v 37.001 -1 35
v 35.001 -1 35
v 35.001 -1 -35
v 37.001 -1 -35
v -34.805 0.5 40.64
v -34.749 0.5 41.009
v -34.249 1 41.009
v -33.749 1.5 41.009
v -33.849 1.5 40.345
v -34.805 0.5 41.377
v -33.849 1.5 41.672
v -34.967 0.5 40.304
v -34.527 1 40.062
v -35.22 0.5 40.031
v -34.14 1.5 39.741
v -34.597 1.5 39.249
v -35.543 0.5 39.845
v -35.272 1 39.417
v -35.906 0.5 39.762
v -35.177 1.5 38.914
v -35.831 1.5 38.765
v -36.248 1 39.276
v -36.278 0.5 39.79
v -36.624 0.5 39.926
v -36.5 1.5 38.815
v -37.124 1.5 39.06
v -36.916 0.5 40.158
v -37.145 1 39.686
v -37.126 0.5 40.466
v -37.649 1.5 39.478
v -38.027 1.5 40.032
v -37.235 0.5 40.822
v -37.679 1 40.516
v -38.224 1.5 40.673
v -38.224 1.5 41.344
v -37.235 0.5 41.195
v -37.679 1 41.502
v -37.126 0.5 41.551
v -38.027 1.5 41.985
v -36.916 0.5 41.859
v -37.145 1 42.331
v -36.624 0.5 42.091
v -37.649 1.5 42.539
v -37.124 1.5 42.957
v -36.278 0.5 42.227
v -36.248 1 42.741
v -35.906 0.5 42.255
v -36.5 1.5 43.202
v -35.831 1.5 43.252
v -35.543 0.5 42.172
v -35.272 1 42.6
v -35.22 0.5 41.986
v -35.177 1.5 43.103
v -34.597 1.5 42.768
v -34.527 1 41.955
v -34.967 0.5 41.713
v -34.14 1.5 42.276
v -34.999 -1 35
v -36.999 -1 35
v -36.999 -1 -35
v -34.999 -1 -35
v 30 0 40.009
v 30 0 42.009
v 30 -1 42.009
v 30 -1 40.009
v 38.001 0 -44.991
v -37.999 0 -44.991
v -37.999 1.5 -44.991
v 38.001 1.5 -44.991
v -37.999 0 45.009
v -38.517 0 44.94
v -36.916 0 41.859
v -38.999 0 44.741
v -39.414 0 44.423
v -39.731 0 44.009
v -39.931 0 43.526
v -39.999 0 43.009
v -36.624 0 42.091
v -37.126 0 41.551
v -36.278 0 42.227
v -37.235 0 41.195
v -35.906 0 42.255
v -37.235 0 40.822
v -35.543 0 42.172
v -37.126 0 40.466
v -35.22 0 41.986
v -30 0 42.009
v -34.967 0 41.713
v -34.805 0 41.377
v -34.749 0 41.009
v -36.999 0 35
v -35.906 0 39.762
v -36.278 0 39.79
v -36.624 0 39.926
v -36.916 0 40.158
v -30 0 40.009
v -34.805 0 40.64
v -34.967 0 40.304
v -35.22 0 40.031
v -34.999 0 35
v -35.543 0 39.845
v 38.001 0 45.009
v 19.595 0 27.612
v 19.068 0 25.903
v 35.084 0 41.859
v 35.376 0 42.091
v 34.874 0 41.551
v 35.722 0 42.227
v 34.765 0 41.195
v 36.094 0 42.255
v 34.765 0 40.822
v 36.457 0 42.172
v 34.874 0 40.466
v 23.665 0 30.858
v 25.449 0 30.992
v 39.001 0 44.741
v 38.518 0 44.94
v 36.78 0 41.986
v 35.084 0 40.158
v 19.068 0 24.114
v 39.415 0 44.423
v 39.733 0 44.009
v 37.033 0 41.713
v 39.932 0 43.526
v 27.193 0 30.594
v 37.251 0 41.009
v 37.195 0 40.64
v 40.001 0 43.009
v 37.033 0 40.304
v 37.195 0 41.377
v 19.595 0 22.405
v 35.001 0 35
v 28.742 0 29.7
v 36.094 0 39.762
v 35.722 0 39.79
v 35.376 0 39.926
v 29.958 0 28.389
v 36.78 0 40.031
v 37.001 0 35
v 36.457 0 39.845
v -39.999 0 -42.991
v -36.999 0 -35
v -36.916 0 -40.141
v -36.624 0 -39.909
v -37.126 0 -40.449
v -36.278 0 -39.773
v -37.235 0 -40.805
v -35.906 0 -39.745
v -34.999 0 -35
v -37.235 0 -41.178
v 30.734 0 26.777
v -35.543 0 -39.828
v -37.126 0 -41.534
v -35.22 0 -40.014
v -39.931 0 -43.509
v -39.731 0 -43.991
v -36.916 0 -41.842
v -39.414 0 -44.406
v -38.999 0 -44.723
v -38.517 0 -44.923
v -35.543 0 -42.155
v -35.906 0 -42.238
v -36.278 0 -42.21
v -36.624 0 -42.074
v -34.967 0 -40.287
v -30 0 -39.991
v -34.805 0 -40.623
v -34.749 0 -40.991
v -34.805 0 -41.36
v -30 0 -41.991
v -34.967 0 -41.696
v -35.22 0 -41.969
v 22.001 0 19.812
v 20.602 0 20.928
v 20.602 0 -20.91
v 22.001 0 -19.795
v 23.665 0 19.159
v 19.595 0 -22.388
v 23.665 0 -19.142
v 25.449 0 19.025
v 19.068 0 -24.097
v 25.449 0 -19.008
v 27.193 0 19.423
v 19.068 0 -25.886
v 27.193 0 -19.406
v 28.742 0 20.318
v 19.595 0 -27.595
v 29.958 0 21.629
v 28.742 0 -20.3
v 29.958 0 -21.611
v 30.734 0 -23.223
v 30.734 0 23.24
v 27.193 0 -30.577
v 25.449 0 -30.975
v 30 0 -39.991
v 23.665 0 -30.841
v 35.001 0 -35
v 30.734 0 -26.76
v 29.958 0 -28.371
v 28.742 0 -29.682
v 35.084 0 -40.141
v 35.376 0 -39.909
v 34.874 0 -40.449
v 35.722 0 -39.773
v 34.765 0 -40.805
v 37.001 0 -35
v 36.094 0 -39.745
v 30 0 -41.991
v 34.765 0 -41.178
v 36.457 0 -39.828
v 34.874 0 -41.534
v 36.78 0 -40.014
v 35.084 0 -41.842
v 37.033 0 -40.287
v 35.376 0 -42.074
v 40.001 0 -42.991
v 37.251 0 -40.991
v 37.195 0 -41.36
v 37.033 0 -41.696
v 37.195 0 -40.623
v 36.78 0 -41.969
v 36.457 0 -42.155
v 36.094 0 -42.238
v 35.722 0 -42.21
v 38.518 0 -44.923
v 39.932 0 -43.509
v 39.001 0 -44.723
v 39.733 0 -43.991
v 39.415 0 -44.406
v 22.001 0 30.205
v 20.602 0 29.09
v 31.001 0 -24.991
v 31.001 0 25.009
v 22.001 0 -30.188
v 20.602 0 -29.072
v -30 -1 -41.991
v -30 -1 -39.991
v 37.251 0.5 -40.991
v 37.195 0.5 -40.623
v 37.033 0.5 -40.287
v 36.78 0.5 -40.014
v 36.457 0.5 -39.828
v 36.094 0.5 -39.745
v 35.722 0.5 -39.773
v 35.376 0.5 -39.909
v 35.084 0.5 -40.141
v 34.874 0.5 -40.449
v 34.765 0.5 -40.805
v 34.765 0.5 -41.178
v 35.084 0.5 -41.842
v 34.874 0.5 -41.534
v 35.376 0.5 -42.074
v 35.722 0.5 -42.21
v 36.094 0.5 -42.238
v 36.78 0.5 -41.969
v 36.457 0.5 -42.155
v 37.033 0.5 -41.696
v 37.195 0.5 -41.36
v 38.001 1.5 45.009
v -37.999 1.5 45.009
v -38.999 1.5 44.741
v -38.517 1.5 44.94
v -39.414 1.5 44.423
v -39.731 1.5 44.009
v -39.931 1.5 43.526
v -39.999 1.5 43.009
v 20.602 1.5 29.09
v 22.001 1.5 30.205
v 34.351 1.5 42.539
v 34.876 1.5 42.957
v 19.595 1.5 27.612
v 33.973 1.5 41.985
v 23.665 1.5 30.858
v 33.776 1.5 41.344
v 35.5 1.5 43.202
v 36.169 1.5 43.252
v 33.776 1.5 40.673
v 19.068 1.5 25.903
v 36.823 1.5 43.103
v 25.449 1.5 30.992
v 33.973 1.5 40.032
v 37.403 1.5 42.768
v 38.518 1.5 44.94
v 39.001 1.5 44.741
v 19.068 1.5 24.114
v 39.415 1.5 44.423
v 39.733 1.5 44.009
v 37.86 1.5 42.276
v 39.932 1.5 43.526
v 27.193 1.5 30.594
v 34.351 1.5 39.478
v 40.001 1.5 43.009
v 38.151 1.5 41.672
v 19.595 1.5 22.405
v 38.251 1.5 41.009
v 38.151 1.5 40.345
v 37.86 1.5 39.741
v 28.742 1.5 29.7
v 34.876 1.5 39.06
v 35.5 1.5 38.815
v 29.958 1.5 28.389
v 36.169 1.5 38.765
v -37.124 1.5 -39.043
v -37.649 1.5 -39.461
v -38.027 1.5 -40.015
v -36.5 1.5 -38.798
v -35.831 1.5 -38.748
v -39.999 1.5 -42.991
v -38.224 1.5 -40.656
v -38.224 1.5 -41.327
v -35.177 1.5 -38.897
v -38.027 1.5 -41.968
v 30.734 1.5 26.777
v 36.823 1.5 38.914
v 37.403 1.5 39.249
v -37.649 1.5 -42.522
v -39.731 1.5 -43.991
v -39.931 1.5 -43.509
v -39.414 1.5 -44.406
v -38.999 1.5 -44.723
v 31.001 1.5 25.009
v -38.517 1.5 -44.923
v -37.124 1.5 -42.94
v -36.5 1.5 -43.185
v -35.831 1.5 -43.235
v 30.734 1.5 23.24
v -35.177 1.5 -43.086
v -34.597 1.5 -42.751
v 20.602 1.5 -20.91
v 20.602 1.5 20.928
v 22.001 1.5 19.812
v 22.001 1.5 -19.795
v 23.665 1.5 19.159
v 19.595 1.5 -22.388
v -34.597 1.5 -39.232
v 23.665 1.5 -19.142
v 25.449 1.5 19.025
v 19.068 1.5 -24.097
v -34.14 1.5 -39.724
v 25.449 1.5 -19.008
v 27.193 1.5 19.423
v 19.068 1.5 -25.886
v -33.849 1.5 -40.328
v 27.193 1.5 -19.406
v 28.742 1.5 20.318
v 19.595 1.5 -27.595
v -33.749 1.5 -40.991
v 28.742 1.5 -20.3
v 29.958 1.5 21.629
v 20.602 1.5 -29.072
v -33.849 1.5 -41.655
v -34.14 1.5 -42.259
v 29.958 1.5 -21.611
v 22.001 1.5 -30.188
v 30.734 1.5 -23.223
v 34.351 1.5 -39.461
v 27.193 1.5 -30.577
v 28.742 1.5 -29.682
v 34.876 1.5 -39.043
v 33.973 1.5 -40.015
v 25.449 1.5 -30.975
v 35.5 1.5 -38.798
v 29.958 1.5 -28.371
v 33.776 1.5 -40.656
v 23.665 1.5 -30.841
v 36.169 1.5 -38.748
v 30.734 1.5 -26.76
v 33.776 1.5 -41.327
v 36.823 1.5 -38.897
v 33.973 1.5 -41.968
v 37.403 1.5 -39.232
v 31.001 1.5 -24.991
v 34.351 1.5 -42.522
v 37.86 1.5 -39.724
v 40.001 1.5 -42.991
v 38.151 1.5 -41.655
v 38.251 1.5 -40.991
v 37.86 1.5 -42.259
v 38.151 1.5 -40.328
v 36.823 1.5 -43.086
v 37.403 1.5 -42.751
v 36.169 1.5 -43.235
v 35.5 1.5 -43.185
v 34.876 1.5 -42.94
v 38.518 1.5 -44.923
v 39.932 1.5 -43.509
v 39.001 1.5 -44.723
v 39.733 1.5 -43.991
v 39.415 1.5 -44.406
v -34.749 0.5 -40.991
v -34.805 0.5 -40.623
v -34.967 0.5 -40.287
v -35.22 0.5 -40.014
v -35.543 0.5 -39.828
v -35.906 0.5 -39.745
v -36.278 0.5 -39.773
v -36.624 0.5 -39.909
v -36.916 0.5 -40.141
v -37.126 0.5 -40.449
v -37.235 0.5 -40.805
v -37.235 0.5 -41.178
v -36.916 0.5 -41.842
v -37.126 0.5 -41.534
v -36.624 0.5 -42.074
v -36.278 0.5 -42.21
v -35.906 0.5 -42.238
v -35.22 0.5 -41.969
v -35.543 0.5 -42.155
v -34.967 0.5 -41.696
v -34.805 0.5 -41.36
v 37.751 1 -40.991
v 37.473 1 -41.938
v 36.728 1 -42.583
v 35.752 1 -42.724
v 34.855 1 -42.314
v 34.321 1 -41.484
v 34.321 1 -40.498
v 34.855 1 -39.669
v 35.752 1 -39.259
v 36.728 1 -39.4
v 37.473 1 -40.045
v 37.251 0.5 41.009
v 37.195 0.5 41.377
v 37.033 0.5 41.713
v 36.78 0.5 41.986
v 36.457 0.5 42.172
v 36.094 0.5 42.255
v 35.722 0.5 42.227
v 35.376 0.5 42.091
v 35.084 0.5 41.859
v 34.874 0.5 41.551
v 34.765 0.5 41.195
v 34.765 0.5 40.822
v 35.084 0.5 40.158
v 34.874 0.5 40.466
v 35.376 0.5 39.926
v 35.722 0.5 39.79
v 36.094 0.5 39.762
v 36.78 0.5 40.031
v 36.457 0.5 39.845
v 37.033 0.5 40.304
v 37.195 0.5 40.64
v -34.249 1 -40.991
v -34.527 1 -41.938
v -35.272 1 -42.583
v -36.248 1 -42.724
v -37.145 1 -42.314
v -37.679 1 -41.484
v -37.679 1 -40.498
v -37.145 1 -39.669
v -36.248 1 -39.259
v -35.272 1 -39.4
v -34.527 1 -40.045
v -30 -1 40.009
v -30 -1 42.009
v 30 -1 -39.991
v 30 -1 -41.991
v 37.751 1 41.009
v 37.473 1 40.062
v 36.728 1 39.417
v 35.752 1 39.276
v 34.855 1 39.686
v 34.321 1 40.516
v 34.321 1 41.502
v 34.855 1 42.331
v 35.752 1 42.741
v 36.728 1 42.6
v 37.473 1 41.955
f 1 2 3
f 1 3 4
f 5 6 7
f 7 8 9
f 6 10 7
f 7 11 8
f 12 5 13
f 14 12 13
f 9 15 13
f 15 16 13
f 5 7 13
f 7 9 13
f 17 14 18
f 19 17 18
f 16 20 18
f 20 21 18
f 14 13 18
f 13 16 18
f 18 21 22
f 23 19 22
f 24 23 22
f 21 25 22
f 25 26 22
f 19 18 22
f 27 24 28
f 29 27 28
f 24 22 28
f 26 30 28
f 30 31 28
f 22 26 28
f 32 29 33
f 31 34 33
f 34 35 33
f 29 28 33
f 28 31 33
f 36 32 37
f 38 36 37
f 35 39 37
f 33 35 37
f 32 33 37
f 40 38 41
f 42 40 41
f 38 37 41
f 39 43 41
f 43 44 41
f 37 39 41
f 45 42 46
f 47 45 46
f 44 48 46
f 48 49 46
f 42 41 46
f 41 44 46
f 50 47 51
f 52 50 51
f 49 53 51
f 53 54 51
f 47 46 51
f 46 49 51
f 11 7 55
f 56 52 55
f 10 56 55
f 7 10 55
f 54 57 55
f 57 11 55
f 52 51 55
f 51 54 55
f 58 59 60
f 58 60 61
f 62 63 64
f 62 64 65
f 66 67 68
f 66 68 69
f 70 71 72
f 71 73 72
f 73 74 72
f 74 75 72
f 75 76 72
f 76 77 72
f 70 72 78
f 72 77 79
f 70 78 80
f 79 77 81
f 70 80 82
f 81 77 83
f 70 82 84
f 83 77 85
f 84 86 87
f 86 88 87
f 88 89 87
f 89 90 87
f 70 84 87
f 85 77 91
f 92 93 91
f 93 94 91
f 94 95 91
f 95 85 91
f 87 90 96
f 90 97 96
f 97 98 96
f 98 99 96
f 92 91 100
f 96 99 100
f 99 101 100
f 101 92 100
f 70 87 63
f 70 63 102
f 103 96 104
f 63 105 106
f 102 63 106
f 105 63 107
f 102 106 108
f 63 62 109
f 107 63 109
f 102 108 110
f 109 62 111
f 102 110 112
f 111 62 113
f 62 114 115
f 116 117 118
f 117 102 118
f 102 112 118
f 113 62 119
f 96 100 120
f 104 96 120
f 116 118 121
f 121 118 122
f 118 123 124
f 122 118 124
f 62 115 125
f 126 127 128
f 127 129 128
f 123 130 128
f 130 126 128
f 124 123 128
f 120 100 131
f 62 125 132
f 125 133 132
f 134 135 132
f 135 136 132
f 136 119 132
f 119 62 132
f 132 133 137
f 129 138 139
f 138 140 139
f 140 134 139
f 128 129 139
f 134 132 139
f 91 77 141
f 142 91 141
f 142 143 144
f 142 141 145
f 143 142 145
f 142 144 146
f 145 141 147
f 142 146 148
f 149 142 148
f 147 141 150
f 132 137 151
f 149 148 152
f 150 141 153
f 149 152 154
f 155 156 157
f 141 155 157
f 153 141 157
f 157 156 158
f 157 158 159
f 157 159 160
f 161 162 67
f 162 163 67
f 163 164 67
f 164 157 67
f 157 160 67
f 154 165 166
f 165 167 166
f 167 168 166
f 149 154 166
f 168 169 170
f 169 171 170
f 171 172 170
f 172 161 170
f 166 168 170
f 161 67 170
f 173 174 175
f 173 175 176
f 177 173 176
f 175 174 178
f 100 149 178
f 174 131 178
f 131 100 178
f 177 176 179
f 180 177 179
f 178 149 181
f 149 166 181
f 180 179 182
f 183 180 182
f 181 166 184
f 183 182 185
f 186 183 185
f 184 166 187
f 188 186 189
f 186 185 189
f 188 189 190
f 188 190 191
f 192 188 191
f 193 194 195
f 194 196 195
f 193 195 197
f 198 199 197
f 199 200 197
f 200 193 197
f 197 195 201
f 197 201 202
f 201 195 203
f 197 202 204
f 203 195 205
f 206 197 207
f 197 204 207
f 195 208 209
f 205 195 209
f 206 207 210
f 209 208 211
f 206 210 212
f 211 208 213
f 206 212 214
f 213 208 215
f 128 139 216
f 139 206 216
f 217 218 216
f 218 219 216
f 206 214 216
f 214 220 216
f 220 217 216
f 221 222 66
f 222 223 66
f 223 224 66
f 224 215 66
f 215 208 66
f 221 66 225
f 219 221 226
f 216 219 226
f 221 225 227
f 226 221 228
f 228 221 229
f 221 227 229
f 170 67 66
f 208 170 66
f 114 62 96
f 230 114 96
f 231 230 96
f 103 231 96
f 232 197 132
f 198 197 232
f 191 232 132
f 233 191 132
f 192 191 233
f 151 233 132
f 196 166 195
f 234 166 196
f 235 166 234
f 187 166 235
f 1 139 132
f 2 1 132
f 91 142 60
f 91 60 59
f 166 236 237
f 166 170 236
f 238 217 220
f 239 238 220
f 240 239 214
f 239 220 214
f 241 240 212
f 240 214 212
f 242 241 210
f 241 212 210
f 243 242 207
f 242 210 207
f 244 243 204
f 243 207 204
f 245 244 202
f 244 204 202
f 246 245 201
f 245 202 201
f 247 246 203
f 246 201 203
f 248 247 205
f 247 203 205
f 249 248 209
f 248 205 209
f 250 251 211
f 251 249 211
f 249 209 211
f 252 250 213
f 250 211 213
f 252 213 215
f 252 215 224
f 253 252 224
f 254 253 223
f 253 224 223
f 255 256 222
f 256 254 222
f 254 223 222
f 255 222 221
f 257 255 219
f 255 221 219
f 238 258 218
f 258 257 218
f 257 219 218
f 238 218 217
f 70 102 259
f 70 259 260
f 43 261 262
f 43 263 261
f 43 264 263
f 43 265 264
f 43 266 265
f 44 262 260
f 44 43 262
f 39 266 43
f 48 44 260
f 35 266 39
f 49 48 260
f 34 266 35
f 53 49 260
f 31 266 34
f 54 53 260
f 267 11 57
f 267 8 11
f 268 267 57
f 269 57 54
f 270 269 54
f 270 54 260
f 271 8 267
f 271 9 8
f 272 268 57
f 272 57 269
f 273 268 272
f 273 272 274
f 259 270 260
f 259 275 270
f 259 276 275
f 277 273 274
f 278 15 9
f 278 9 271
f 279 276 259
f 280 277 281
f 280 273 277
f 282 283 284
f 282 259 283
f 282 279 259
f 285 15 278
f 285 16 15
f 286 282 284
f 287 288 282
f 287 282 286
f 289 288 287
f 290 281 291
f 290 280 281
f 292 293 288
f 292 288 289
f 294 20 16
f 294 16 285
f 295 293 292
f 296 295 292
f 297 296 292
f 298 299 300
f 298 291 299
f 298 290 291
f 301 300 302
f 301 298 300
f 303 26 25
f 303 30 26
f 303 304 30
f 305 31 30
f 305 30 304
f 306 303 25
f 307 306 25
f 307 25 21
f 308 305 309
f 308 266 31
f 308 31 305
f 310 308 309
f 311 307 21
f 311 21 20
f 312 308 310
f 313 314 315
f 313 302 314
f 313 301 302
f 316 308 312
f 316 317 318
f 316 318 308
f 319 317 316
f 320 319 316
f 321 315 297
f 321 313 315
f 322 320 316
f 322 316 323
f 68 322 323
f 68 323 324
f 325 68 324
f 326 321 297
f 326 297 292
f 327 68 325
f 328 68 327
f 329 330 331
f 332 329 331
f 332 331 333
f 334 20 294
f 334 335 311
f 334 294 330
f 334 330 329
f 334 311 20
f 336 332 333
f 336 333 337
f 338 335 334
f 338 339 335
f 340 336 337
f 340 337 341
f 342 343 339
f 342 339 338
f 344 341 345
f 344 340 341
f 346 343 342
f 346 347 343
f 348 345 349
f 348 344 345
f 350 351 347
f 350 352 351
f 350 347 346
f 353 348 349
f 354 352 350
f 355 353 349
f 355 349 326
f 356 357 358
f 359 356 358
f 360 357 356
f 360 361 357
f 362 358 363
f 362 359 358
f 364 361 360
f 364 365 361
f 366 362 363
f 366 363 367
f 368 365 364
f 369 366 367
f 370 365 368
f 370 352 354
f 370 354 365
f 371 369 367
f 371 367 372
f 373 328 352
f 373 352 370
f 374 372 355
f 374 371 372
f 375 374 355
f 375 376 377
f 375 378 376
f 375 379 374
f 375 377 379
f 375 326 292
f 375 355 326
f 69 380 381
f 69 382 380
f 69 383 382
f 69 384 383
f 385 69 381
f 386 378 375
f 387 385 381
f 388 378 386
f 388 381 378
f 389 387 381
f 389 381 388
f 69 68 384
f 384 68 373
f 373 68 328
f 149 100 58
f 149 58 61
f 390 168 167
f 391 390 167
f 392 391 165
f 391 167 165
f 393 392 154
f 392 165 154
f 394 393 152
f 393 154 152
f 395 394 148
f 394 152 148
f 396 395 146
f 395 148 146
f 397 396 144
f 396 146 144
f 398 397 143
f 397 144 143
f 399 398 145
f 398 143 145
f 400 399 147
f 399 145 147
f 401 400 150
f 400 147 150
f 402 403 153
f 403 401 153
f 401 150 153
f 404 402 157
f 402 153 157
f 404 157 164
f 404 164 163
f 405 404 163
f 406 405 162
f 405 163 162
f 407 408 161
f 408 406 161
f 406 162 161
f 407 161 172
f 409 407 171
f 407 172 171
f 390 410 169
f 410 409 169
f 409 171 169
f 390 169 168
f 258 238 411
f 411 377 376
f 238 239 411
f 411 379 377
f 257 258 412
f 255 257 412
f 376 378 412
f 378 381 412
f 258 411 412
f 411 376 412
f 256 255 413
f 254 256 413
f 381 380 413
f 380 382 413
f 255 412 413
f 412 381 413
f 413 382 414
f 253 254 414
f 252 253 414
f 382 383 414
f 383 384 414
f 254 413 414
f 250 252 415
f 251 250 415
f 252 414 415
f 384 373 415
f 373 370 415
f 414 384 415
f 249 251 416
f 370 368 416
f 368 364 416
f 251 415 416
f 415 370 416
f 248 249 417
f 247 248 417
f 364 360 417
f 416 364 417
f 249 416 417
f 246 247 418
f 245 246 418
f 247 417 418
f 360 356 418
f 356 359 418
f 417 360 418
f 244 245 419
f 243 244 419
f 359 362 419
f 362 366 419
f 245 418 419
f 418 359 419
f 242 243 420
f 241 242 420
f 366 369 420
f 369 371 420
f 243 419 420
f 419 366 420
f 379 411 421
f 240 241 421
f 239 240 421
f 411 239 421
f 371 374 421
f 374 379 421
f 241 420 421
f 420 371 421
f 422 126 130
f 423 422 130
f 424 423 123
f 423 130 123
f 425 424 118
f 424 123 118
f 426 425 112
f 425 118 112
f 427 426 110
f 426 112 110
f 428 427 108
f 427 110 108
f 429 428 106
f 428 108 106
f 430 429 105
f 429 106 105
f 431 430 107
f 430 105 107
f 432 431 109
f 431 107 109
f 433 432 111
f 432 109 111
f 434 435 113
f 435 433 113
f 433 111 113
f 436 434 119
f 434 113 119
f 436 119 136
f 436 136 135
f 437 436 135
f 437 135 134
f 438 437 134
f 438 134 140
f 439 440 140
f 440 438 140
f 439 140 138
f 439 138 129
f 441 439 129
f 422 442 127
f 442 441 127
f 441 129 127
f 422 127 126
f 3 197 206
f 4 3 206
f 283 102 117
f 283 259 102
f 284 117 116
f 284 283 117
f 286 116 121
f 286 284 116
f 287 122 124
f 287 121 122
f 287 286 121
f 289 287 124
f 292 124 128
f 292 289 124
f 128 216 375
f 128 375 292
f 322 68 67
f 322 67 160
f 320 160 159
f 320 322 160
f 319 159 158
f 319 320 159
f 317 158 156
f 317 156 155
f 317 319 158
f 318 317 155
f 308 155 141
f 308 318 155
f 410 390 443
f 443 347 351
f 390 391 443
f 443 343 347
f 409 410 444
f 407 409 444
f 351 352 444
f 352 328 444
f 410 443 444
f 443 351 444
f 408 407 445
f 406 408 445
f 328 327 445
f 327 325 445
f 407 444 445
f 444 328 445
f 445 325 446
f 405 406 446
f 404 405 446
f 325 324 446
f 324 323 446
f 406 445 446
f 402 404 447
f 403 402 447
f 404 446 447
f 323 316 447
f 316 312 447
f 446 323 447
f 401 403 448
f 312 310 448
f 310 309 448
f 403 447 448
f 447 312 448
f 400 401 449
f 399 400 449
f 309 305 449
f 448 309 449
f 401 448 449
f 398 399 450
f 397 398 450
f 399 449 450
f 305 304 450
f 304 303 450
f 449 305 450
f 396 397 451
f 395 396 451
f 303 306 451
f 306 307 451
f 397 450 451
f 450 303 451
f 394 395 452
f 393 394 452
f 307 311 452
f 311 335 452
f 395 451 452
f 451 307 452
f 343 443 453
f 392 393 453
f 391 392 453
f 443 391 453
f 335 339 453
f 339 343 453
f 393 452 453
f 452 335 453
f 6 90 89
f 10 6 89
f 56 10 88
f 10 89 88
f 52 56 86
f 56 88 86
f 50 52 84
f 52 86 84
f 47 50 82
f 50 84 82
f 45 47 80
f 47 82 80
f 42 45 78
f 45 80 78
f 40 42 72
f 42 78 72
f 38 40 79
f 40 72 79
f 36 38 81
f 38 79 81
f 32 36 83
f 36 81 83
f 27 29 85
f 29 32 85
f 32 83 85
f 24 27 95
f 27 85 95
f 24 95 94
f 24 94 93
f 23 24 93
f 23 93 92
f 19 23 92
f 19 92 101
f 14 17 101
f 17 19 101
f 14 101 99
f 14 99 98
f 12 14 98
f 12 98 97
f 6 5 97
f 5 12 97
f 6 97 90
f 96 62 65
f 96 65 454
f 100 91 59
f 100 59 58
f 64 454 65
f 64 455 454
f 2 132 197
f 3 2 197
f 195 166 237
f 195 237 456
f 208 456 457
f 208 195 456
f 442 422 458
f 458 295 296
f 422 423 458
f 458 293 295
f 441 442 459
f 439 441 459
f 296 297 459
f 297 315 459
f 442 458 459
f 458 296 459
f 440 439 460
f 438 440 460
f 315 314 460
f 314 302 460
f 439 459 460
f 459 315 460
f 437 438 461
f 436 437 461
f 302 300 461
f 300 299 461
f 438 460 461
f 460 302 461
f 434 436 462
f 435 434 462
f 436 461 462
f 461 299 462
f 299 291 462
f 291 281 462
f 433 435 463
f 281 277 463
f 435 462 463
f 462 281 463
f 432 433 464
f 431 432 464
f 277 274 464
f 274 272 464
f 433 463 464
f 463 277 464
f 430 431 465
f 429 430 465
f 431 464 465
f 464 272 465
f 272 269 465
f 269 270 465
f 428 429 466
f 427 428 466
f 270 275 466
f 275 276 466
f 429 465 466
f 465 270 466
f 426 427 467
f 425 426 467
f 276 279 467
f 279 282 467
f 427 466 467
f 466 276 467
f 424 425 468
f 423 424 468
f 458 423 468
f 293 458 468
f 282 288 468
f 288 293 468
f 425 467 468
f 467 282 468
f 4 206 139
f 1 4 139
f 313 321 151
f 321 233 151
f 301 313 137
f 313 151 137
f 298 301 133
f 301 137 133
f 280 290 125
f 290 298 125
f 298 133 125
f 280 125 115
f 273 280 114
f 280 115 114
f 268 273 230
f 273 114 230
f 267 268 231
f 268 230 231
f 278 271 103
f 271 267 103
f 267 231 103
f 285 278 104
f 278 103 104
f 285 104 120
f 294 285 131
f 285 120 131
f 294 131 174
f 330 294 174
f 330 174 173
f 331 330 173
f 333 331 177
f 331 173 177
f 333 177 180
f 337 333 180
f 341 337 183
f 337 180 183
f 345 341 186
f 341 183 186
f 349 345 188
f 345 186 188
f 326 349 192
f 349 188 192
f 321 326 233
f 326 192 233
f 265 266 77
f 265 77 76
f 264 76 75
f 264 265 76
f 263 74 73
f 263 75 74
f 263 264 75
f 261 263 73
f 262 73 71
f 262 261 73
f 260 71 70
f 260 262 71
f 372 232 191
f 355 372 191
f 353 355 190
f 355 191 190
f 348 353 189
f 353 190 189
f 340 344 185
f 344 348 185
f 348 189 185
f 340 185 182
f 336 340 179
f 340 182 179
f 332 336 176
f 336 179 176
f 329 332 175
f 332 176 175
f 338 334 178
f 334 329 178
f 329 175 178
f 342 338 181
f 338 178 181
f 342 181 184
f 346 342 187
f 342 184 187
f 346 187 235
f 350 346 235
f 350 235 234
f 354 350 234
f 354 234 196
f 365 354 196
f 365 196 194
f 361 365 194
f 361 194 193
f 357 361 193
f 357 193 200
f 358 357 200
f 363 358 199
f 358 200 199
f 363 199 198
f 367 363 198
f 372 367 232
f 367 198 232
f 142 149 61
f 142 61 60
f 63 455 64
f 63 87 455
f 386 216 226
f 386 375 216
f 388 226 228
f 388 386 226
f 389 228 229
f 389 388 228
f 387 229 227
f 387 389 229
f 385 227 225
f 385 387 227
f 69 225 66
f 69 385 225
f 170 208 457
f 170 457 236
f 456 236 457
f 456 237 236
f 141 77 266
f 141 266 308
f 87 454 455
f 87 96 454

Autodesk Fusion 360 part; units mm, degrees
sketch "Skizze1" plane through (0, 0, 0) normal (0, 1, 0) x (1, 0, 0)
  line L0 (-39.9994, 44.9914) -> (40.0006, 44.9914)
  line L1 (40.0006, 44.9914) -> (40.0006, -45.0086)
  line L2 (40.0006, -45.0086) -> (-39.9994, -45.0086)
  line L3 (-39.9994, -45.0086) -> (-39.9994, 44.9914)
  circle A0 centre (-35.9994, 40.9914) radius 1.25
  circle A1 centre (36.0006, 40.9914) radius 1.25
  circle A2 centre (36.0006, -41.0086) radius 1.25
  circle A3 centre (-35.9994, -41.0086) radius 1.25
  circle A4 centre (25.0006, 24.9914) radius 6
  circle A5 centre (25.0006, -25.0086) radius 6
  dimension "d1" = 80
  dimension "d2" = 90
  dimension "d3" = 2.5
  dimension "d4" = 4
  dimension "d5" = 4
  dimension "d6" = 2.5
  dimension "d7" = 4
  dimension "d8" = 4
  dimension "d9" = 2.5
  dimension "d10" = 4
  dimension "d11" = 4
  dimension "d12" = 2.5
  dimension "d13" = 4
  dimension "d14" = 4
  dimension "d39" = 12
  dimension "d40" = 12
  dimension "d41" = 15
  dimension "d42" = 20
  dimension "d43" = 15
  dimension "d44" = 20
extrude "Extrusion1" add sketch "Skizze1" along normal blind 1.5
fillet "Abrundung1" radius 2 1 edges at (-39.9994, 0.75, 45.0086)
fillet "Abrundung1" radius 2 1 edges at (40.0006, 0.75, 45.0086)
fillet "Abrundung1" radius 2 1 edges at (-39.9994, 0.75, -44.9914)
fillet "Abrundung1" radius 2 1 edges at (40.0006, 0.75, -44.9914)
chamfer "Fase1" distance 1 angle 45 1 edges at (-37.1648, 1.5, -41.4434)
chamfer "Fase1" distance 1 angle 45 1 edges at (34.8352, 1.5, -41.4434)
chamfer "Fase1" distance 1 angle 45 1 edges at (-37.1648, 1.5, 40.5566)
chamfer "Fase1" distance 1 angle 45 1 edges at (34.8352, 1.5, 40.5566)
sketch "Skizze3" plane through (0, 0, 0) normal (0, -1, 0) x (1, 0, 0)
  arc A0 (38.0006, -44.9914) -> (40.0006, -42.9914) centre (38.0006, -42.9914) ccw
  line L0 (40.0006, -42.9914) -> (40.0006, 43.0086)
  arc A1 (40.0006, 43.0086) -> (38.0006, 45.0086) centre (38.0006, 43.0086) ccw
  line L1 (38.0006, 45.0086) -> (-37.9994, 45.0086)
  arc A2 (-37.9994, 45.0086) -> (-39.9994, 43.0086) centre (-37.9994, 43.0086) ccw
  line L2 (-39.9994, 43.0086) -> (-39.9994, -42.9914)
  arc A3 (-39.9994, -42.9914) -> (-37.9994, -44.9914) centre (-37.9994, -42.9914) ccw
  line L3 (-37.9994, -44.9914) -> (38.0006, -44.9914)
  circle A4 centre (-35.9994, -40.9914) radius 1.25
  circle A5 centre (36.0006, 41.0086) radius 1.25
  circle A6 centre (36.0006, -40.9914) radius 1.25
  circle A7 centre (-35.9994, 41.0086) radius 1.25
  line L4 (-36.9994, 35) -> (-34.9994, 35)
  line L5 (-34.9994, 35) -> (-34.9994, -35)
  line L6 (-34.9994, -35) -> (-36.9994, -35)
  line L7 (-36.9994, -35) -> (-36.9994, 35)
  line L8 (-30, 42.0086) -> (30, 42.0086)
  line L9 (30, 42.0086) -> (30, 40.0086)
  line L10 (30, 40.0086) -> (-30, 40.0086)
  line L11 (-30, 40.0086) -> (-30, 42.0086)
  line L12 (37.0006, 35) -> (35.0006, 35)
  line L13 (35.0006, 35) -> (35.0006, -35)
  line L14 (35.0006, -35) -> (37.0006, -35)
  line L15 (37.0006, -35) -> (37.0006, 35)
  line L16 (30, -41.9914) -> (-30, -41.9914)
  line L17 (-30, -41.9914) -> (-30, -39.9914)
  line L18 (-30, -39.9914) -> (30, -39.9914)
  line L19 (30, -39.9914) -> (30, -41.9914)
  circle A8 centre (25.0006, -24.9914) radius 6
  circle A9 centre (25.0006, 25.0086) radius 6
  dimension "d29" = 2
  dimension "d30" = 2
  dimension "d31" = 2
  dimension "d32" = 2
  dimension "d33" = 3
  dimension "d34" = 3
  dimension "d35" = 3
  dimension "d36" = 3
extrude "Extrusion2" add sketch "Skizze3" along normal blind 1 contours L4 L5 L6 L7 | L8 L9 L10 L11 | L12 L13 L14 L15 | L16 L17 L18 L19
